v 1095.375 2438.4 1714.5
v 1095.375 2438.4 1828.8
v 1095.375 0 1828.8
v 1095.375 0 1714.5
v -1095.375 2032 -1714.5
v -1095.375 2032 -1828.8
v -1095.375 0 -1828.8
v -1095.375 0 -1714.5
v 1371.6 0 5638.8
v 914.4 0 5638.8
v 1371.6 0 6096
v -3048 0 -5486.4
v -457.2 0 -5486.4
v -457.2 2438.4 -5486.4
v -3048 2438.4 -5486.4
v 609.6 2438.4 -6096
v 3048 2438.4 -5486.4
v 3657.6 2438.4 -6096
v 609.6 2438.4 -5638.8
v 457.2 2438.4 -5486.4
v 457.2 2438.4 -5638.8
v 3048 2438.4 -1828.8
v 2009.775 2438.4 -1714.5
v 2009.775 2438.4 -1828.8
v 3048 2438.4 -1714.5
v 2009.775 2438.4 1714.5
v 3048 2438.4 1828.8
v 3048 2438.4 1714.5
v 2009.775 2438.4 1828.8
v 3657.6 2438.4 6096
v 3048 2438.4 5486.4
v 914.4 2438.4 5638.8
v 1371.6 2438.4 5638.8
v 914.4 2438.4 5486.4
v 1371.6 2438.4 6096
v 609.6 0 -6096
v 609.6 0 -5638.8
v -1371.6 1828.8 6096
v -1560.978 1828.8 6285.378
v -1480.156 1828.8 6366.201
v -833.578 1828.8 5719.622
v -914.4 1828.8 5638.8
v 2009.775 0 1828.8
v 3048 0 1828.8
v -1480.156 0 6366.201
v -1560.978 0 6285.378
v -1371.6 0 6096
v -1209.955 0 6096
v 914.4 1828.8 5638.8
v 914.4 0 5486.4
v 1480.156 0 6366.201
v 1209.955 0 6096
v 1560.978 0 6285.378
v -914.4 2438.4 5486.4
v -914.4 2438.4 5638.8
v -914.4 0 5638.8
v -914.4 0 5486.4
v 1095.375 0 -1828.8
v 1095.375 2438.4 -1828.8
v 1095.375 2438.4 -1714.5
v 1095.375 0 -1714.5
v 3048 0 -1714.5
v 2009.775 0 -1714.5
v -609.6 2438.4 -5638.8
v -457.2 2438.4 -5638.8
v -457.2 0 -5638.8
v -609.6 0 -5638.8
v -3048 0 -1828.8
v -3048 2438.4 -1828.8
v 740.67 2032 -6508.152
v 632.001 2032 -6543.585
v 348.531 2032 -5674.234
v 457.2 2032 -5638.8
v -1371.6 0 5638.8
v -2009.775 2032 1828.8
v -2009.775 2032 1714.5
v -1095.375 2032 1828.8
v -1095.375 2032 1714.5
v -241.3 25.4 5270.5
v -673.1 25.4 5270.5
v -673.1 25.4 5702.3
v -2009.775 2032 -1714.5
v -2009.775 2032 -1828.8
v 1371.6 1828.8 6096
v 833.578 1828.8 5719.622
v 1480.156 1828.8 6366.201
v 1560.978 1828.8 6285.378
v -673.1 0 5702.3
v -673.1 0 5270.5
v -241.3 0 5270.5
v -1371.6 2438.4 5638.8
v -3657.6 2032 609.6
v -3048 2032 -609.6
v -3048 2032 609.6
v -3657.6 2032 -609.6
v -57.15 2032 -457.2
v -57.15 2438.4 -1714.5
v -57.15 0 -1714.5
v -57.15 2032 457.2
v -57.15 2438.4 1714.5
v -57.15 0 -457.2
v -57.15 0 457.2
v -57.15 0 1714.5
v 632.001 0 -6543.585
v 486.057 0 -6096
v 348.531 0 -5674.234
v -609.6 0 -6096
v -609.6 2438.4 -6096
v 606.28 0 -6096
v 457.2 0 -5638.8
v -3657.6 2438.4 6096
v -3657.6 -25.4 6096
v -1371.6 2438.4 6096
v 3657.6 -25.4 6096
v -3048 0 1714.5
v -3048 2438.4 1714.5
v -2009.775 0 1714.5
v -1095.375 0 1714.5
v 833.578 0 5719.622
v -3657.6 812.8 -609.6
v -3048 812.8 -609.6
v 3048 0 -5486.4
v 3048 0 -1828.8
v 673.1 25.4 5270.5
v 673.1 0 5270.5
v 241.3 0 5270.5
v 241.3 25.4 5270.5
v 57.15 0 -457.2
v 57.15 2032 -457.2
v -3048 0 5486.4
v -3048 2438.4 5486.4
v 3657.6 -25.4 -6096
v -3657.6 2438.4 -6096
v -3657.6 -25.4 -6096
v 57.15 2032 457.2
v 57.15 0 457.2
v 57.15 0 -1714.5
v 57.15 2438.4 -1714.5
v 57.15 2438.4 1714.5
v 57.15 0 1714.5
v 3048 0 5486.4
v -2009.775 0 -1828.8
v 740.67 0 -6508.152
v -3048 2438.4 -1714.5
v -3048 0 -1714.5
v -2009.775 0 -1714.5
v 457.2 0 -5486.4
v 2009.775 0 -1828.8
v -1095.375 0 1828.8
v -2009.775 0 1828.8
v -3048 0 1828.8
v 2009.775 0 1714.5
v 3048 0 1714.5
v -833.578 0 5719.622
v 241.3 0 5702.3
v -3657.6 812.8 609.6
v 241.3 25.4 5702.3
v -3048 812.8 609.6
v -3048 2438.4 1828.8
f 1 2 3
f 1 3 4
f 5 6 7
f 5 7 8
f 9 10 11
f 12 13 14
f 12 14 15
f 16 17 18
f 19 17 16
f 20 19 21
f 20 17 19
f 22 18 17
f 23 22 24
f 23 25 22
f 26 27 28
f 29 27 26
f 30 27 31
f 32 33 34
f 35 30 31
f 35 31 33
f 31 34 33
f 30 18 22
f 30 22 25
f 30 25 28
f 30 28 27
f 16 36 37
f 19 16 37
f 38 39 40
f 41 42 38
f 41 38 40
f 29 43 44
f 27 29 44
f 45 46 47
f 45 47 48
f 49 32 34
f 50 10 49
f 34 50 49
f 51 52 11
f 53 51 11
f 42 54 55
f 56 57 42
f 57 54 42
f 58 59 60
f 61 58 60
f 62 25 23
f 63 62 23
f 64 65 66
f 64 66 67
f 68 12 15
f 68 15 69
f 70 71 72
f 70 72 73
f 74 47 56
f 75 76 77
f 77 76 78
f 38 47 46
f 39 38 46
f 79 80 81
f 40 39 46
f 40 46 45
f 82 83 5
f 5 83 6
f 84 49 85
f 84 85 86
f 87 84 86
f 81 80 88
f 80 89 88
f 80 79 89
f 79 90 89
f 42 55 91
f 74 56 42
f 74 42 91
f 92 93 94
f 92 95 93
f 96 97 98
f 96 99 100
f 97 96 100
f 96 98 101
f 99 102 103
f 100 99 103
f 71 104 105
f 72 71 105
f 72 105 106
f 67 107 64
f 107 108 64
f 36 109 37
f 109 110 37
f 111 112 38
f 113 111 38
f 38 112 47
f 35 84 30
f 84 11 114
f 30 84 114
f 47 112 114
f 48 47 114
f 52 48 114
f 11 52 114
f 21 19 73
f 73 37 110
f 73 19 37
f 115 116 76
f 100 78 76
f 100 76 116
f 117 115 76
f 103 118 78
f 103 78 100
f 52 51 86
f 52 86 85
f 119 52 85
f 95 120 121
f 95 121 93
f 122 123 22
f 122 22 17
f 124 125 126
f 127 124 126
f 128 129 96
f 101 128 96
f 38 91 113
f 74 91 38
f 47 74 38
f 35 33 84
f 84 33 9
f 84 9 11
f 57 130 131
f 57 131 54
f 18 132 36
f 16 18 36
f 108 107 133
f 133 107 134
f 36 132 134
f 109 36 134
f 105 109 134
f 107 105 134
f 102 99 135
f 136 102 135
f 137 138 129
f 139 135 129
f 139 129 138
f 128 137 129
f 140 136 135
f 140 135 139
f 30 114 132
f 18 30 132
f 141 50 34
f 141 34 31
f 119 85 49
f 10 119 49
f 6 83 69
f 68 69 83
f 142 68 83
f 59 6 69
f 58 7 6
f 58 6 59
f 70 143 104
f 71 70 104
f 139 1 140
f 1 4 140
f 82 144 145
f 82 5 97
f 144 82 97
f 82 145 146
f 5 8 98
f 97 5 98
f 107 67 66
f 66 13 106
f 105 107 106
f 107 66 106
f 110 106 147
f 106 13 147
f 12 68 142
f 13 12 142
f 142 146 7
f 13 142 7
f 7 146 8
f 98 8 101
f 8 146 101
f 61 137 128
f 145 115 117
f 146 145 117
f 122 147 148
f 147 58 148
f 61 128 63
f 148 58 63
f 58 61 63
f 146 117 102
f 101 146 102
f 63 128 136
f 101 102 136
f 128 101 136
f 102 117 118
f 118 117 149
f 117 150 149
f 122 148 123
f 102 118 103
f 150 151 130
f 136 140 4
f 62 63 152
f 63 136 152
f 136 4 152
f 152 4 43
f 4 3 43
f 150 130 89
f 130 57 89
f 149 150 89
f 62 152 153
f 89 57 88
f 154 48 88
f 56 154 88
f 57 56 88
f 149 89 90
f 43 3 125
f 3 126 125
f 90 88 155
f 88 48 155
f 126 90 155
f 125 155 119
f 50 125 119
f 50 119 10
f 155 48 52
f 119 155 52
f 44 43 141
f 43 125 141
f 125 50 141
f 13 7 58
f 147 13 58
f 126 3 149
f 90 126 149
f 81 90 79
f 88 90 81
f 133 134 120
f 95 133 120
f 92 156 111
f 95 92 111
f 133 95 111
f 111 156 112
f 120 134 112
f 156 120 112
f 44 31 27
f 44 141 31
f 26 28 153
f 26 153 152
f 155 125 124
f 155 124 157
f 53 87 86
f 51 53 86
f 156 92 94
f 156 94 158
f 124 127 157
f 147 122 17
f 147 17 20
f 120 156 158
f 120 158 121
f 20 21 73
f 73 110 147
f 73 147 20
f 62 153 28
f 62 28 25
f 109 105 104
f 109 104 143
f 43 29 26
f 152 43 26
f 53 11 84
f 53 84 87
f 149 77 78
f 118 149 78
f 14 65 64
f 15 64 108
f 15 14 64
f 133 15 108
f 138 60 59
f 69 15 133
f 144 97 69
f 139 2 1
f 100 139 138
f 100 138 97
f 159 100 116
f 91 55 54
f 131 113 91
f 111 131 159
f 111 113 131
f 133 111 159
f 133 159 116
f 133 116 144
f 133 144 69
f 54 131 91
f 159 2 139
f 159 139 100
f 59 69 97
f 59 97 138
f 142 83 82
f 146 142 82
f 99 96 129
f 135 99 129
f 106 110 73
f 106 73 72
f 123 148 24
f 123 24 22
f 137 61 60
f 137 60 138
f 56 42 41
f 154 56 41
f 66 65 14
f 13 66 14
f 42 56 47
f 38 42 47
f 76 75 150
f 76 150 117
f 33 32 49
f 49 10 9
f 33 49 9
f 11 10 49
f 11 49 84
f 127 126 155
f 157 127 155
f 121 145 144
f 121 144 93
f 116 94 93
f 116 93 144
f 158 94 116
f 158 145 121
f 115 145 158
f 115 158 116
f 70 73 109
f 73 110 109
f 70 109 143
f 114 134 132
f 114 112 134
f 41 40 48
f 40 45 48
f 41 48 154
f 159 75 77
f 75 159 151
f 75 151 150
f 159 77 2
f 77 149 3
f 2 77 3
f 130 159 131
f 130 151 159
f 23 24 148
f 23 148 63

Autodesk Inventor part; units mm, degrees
ref_plane "YZ Plane" through (0, 0, 0) normal (1, 0, 0) x (0, 1, 0)
ref_plane "XZ Plane" through (0, 0, 0) normal (0, 1, 0) x (-1, 0, 0)
ref_plane "XY Plane" through (0, 0, 0) normal (0, 0, 1) x (1, 0, 0)
sketch "Sketch1" plane through (0, 0, 0) normal (0, 1, 0) x (-1, 0, 0)
  line L0 (3657.6, -6096) -> (3657.6, 6096)
  line L1 (-3657.6, 6096) -> (-3657.6, -6096)
  line L2 (-5120.64, 0) -> (5120.64, 0) projected
  line L3 (0, -23842.3169) -> (0, 22994.4703) projected
  line L4 (-3048, 1714.5) -> (-3048, -1714.5)
  line L5 (3048, -5486.4) -> (3048, -1828.8)
  line L6 (3048, -1714.5) -> (3048, 1714.5)
  line L7 (3048, 1828.8) -> (3048, 5486.4)
  line L8 (-3048, -1828.8) -> (-3048, -5486.4)
  line L9 (-3048, 5486.4) -> (-3048, 1828.8)
  line L10 (-3048, 1714.5) -> (-3048, -1714.5)
  line L11 (-2009.775, -1828.8) -> (-2009.775, -1714.5)
  line L12 (-1095.375, -1828.8) -> (-1095.375, -1714.5)
  line L13 (-3048, -1714.5) -> (-2009.775, -1714.5)
  line L14 (-1095.375, -1714.5) -> (-57.15, -1714.5)
  line L15 (-3048, -1828.8) -> (-2009.775, -1828.8)
  line L16 (2009.775, -1828.8) -> (2009.775, -1714.5)
  line L17 (1095.375, -1828.8) -> (1095.375, -1714.5)
  line L18 (3048, -1714.5) -> (2009.775, -1714.5)
  line L19 (1095.375, -1714.5) -> (57.15, -1714.5)
  line L20 (3048, -1828.8) -> (2009.775, -1828.8)
  line L21 (1095.375, -1828.8) -> (-1095.375, -1828.8)
  line L22 (-2009.775, -1828.8) -> (-3048, -1828.8)
  line L23 (-1095.375, -1828.8) -> (1095.375, -1828.8)
  line L24 (2009.775, -1828.8) -> (3048, -1828.8)
  line L25 (57.15, -1714.5) -> (1095.375, -1714.5)
  line L26 (2009.775, -1714.5) -> (3048, -1714.5)
  line L27 (-2009.775, 1828.8) -> (-2009.775, 1714.5)
  line L28 (-1095.375, 1828.8) -> (-1095.375, 1714.5)
  line L29 (-3048, 1714.5) -> (-2009.775, 1714.5)
  line L30 (-1095.375, 1714.5) -> (-57.15, 1714.5)
  line L31 (-3048, 1828.8) -> (-2009.775, 1828.8)
  line L32 (3048, 1714.5) -> (2009.775, 1714.5)
  line L33 (3048, 1828.8) -> (2009.775, 1828.8)
  line L34 (2009.775, 1828.8) -> (2009.775, 1714.5)
  line L35 (1095.375, 1828.8) -> (1095.375, 1714.5)
  line L36 (1095.375, 1714.5) -> (57.15, 1714.5)
  line L37 (1095.375, 1828.8) -> (-1095.375, 1828.8)
  line L38 (-2009.775, 1828.8) -> (-3048, 1828.8)
  line L39 (-1095.375, 1828.8) -> (1095.375, 1828.8)
  line L40 (2009.775, 1828.8) -> (3048, 1828.8)
  line L41 (57.15, 1714.5) -> (1095.375, 1714.5)
  line L42 (2009.775, 1714.5) -> (3048, 1714.5)
  line L43 (-57.15, -457.2) -> (57.15, -457.2)
  line L44 (57.15, 457.2) -> (-57.15, 457.2)
  line L45 (-609.6, -6096) -> (-609.6, -5486.4)
  line L46 (609.6, -6096) -> (609.6, -5486.4)
  line L47 (-3048, -5486.4) -> (-609.6, -5486.4)
  line L48 (609.6, -5486.4) -> (3048, -5486.4)
  line L49 (-3657.6, -6096) -> (-609.6, -6096)
  line L50 (609.6, -6096) -> (3657.6, -6096)
  line L51 (914.4, 5486.4) -> (914.4, 6096)
  line L52 (-914.4, 6096) -> (-914.4, 5486.4)
  line L53 (3048, 5486.4) -> (914.4, 5486.4)
  line L54 (-914.4, 5486.4) -> (-3048, 5486.4)
  line L55 (3657.6, 6096) -> (914.4, 6096)
  line L56 (-914.4, 6096) -> (-3657.6, 6096)
  line L57 (-57.15, -1714.5) -> (-57.15, -457.2)
  line L58 (-57.15, 457.2) -> (-57.15, 1714.5)
  line L59 (-57.15, 1714.5) -> (-57.15, 457.2)
  line L60 (-57.15, -457.2) -> (-57.15, -1714.5)
  line L61 (57.15, -1714.5) -> (57.15, -457.2)
  line L62 (57.15, 457.2) -> (57.15, 1714.5)
  line L63 (57.15, 1714.5) -> (57.15, 457.2)
  line L64 (57.15, -457.2) -> (57.15, -1714.5)
  line L65 (-3048, 5486.4) -> (-3048, 1828.8)
  line L66 (-3048, 1828.8) -> (-2009.775, 1828.8)
  line L67 (-2009.775, 1828.8) -> (-2009.775, 1714.5)
  line L68 (-2009.775, 1714.5) -> (-3048, 1714.5)
  line L69 (-3048, 1714.5) -> (-3048, -1714.5)
  line L70 (-3048, -1714.5) -> (-2009.775, -1714.5)
  line L71 (-2009.775, -1714.5) -> (-2009.775, -1828.8)
  line L72 (-2009.775, -1828.8) -> (-3048, -1828.8)
  line L73 (-3048, -1828.8) -> (-3048, -5486.4)
  line L74 (-3048, -5486.4) -> (-609.6, -5486.4)
  line L75 (609.6, -5486.4) -> (3048, -5486.4)
  line L76 (3048, -5486.4) -> (3048, -1828.8)
  line L77 (3048, -1828.8) -> (2009.775, -1828.8)
  line L78 (2009.775, -1828.8) -> (2009.775, -1714.5)
  line L79 (2009.775, -1714.5) -> (3048, -1714.5)
  line L80 (3048, 1714.5) -> (3048, -1714.5)
  line L81 (3048, 1714.5) -> (2009.775, 1714.5)
  line L82 (2009.775, 1714.5) -> (2009.775, 1828.8)
  line L83 (2009.775, 1828.8) -> (3048, 1828.8)
  line L84 (3048, 1828.8) -> (3048, 5486.4)
  point P0 (0, 0)
  point P1 (0, 23842.3169)
  point P2 (0, -22994.4703)
  dimension "d2" = 7315.2
  dimension "d10" = 609.6
  dimension "d13" = 1038.225
  dimension "d14" = 914.4
  dimension "d17" = 114.3
  dimension "d18" = 1038.225
  dimension "d19" = 1038.225
  dimension "d20" = 914.4
  dimension "d21" = 1219.2
  dimension "d23" = 609.6
  dimension "d24" = 4267.2
  dimension "d25" = 1828.8
  dimension "d26" = 12192
  dimension "d27" = 609.6
  dimension "d28" = 114.3
extrude "Extrusion1" add sketch "Sketch1" along normal blind 2438.4
sketch "Sketch2" plane through (-3657.6, 0, -6096) normal (-1, 0, 0) x (0, 0, 1)
  line L0 (0, 0) -> (12192, 0) projected
  line L1 (5486.4, 2032) -> (6705.6, 2032)
  line L2 (6705.6, 2032) -> (6705.6, 812.8)
  line L3 (6705.6, 812.8) -> (5486.4, 812.8)
  line L4 (5486.4, 812.8) -> (5486.4, 2032)
  line L5 (6096, 2926.08) -> (6096, -487.68) projected
  point P0 (6096, 0)
  dimension "d31" = 1219.2
  dimension "d33" = 1219.2
  dimension "d34" = 812.8
extrude "Extrusion2" cut sketch "Sketch2" against normal up to surface (609.6 mm away)
sketch "Sketch3" plane through (0, 2438.4, 0) normal (0, 1, 0) x (1, 0, 0)
  line L0 (57.15, 1714.5) -> (1095.375, 1714.5) projected
  line L1 (1095.375, 1714.5) -> (1095.375, 1828.8) projected
  line L2 (1095.375, 1828.8) -> (-1095.375, 1828.8) projected
  line L3 (-1095.375, 1828.8) -> (-1095.375, 1714.5) projected
  line L4 (-1095.375, 1714.5) -> (-57.15, 1714.5) projected
  line L5 (-57.15, 1714.5) -> (-57.15, 457.2) projected
  line L6 (-57.15, 457.2) -> (57.15, 457.2) projected
  line L7 (57.15, 457.2) -> (57.15, 1714.5) projected
  line L8 (-57.15, -1714.5) -> (-1095.375, -1714.5) projected
  line L9 (-1095.375, -1714.5) -> (-1095.375, -1828.8) projected
  line L10 (-1095.375, -1828.8) -> (1095.375, -1828.8) projected
  line L11 (1095.375, -1828.8) -> (1095.375, -1714.5) projected
  line L12 (1095.375, -1714.5) -> (57.15, -1714.5) projected
  line L13 (57.15, -1714.5) -> (57.15, -457.2) projected
  line L14 (57.15, -457.2) -> (-57.15, -457.2) projected
  line L15 (-57.15, -457.2) -> (-57.15, -1714.5) projected
  line L16 (3657.6, 6096) -> (609.6, 6096) projected
  line L17 (609.6, 6096) -> (609.6, 5486.4) projected
  line L18 (609.6, 5486.4) -> (3048, 5486.4) projected
  line L19 (3048, 5486.4) -> (3048, 1828.8) projected
  line L20 (3048, 1828.8) -> (2009.775, 1828.8) projected
  line L21 (2009.775, 1828.8) -> (2009.775, 1714.5) projected
  line L22 (2009.775, 1714.5) -> (3048, 1714.5) projected
  line L23 (3048, 1714.5) -> (3048, -1714.5) projected
  line L24 (3048, -1714.5) -> (2009.775, -1714.5) projected
  line L25 (2009.775, -1714.5) -> (2009.775, -1828.8) projected
  line L26 (2009.775, -1828.8) -> (3048, -1828.8) projected
  line L27 (3048, -1828.8) -> (3048, -5486.4) projected
  line L28 (3048, -5486.4) -> (914.4, -5486.4) projected
  line L29 (914.4, -5486.4) -> (914.4, -6096) projected
  line L30 (914.4, -6096) -> (3657.6, -6096) projected
  line L31 (3657.6, -6096) -> (3657.6, 6096) projected
  line L32 (-609.6, 6096) -> (609.6, 6096)
  line L33 (609.6, 6096) -> (609.6, 5486.4)
  line L34 (609.6, 5486.4) -> (-609.6, 5486.4)
  line L35 (-609.6, 5486.4) -> (-609.6, 6096)
  line L36 (-2009.775, 1828.8) -> (-1095.375, 1828.8)
  line L37 (-1095.375, 1828.8) -> (-1095.375, 1714.5)
  line L38 (-1095.375, 1714.5) -> (-2009.775, 1714.5)
  line L39 (-2009.775, 1714.5) -> (-2009.775, 1828.8)
  line L40 (1095.375, 1828.8) -> (2009.775, 1828.8)
  line L41 (2009.775, 1828.8) -> (2009.775, 1714.5)
  line L42 (2009.775, 1714.5) -> (1095.375, 1714.5)
  line L43 (1095.375, 1714.5) -> (1095.375, 1828.8)
  line L44 (-57.15, 457.2) -> (57.15, 457.2)
  line L45 (57.15, 457.2) -> (57.15, -457.2)
  line L46 (57.15, -457.2) -> (-57.15, -457.2)
  line L47 (-57.15, -457.2) -> (-57.15, 457.2)
  line L48 (1095.375, -1714.5) -> (2009.775, -1714.5)
  line L49 (2009.775, -1714.5) -> (2009.775, -1828.8)
  line L50 (2009.775, -1828.8) -> (1095.375, -1828.8)
  line L51 (1095.375, -1828.8) -> (1095.375, -1714.5)
  line L52 (-2009.775, -1714.5) -> (-1095.375, -1714.5)
  line L53 (-1095.375, -1714.5) -> (-1095.375, -1828.8)
  line L54 (-1095.375, -1828.8) -> (-2009.775, -1828.8)
  line L55 (-2009.775, -1828.8) -> (-2009.775, -1714.5)
  line L56 (-914.4, -5486.4) -> (914.4, -5486.4)
  line L57 (914.4, -5486.4) -> (914.4, -6096)
  line L58 (914.4, -6096) -> (-914.4, -6096)
  line L59 (-914.4, -6096) -> (-914.4, -5486.4)
  line L60 (1095.375, 1828.8) -> (2009.775, 1828.8)
  line L61 (2009.775, 1828.8) -> (2009.775, 1714.5)
  line L62 (2009.775, 1714.5) -> (1095.375, 1714.5)
  line L63 (1095.375, 1714.5) -> (1095.375, 1828.8)
  point P0 (0, 0)
extrude "Extrusion3" add sketch "Sketch3" against normal blind 406.4 contours L1 L40 L21 L42 | L45 L14 L47 L6 | L3 L38 L39 L36 | L48 L25 L50 L11 | L9 L54 L55 L52 | L34 L35 L32 L17 | L29 L58 L59 L56
sketch "Sketch5" plane through (0, 0, 0) normal (0, -1, 0) x (1, 0, 0)
  line L0 (3657.6, -6096) -> (609.6, -6096) projected
  line L1 (3657.6, 6096) -> (3657.6, -6096) projected
  line L2 (914.4, 6096) -> (3657.6, 6096) projected
  line L3 (914.4, 5486.4) -> (914.4, 6096) projected
  line L4 (3048, 5486.4) -> (914.4, 5486.4) projected
  line L5 (3048, 1828.8) -> (3048, 5486.4) projected
  line L6 (2009.775, 1828.8) -> (3048, 1828.8) projected
  line L7 (2009.775, 1714.5) -> (2009.775, 1828.8) projected
  line L8 (3048, 1714.5) -> (2009.775, 1714.5) projected
  line L9 (3048, -1714.5) -> (3048, 1714.5) projected
  line L10 (2009.775, -1714.5) -> (3048, -1714.5) projected
  line L11 (2009.775, -1828.8) -> (2009.775, -1714.5) projected
  line L12 (3048, -1828.8) -> (2009.775, -1828.8) projected
  line L13 (3048, -5486.4) -> (3048, -1828.8) projected
  line L14 (609.6, -5486.4) -> (3048, -5486.4) projected
  line L15 (609.6, -6096) -> (609.6, -5486.4) projected
  line L16 (-3657.6, 6096) -> (3657.6, 6096)
  line L17 (3657.6, 6096) -> (3657.6, -6096)
  line L18 (3657.6, -6096) -> (-3657.6, -6096)
  line L19 (-3657.6, -6096) -> (-3657.6, 6096)
  point P0 (0, 0)
extrude "Extrusion5" add sketch "Sketch5" along normal blind 25.4
sketch "Sketch6" plane through (0, 0, 0) normal (0, 1, 0) x (1, 0, 0)
  line L0 (-3048, 5486.4) -> (-609.6, 5486.4) projected
  line L1 (-3048, 1828.8) -> (-3048, 5486.4) projected
  line L2 (57.15, 1714.5) -> (1095.375, 1714.5) projected
  line L3 (2009.775, 1714.5) -> (3048, 1714.5) projected
  line L4 (3048, 1714.5) -> (3048, -1714.5) projected
  circle A0 centre (1549.4, 0) radius 152.4
  line L5 (-1095.375, -1828.8) -> (-1095.375, -1714.5) projected
  line L6 (3048, 1828.8) -> (2009.775, 1828.8) projected
  line L7 (2009.775, 1828.8) -> (2009.775, 1714.5) projected
  line L8 (1095.375, 1828.8) -> (-1095.375, 1828.8) projected
  line L9 (1095.375, 1714.5) -> (1095.375, 1828.8) projected
  circle A1 centre (-1549.4, -3657.6) radius 152.4
  circle A2 centre (1549.4, -3657.6) radius 152.4
  line L10 (3048, -1828.8) -> (3048, -5486.4) projected
  line L11 (3048, -5486.4) -> (914.4, -5486.4) projected
  line L12 (-914.4, -5486.4) -> (-3048, -5486.4) projected
  line L13 (-3048, -5486.4) -> (-3048, -1828.8) projected
  line L14 (-1095.375, -1828.8) -> (1095.375, -1828.8) projected
  line L15 (-3048, -1828.8) -> (-2009.775, -1828.8) projected
  line L16 (609.6, 6096) -> (609.6, 5486.4) projected
  line L17 (-609.6, 5486.4) -> (-609.6, 6096) projected
  line L18 (215.9, 5702.3) -> (-215.9, 5702.3)
  line L19 (-2009.775, -1714.5) -> (-3048, -1714.5) projected
  line L20 (914.4, -5486.4) -> (914.4, -6096) projected
  line L21 (-914.4, -6096) -> (-914.4, -5486.4) projected
  circle A3 centre (457.2, -5486.4) radius 152.4
  line L22 (673.1, -5270.5) -> (241.3, -5270.5)
  line L23 (241.3, -5270.5) -> (241.3, -5702.3)
  line L24 (673.1, -5270.5) -> (241.3, -5702.3)
  line L25 (-241.3, -5270.5) -> (-673.1, -5270.5)
  circle A4 centre (-457.2, -5486.4) radius 152.4
  line L26 (-241.3, -5270.5) -> (-673.1, -5702.3)
  line L27 (-673.1, -5270.5) -> (-673.1, -5702.3)
  line L28 (2009.775, 1714.5) -> (2009.775, 1828.8) projected
  line L29 (5120.64, 0) -> (-5120.64, 0) projected
  point P0 (0, 0)
  point P1 (457.2, -5486.4)
  point P2 (-457.2, -5486.4)
  dimension "d101" = 304.8
  dimension "d106" = 1498.6
  dimension "d120" = 1498.6
  dimension "d121" = 1828.8
  dimension "d154" = 431.8
  dimension "d156" = 304.8
  dimension "d157" = 431.8
  dimension "d158" = 431.8
  dimension "d159" = 215.9
  dimension "d160" = 304.8
  dimension "d161" = 431.8
  dimension "d162" = 431.8
  dimension "d163" = 215.9
  dimension "d164" = 457.2
  dimension "d165" = 457.2
extrude "Extrusion22" add sketch "Sketch6" along normal blind 25.4 contours L24 A3 | A3 L24 L23 L22 | L26 A4 L27 L25 | L26 A4 picked at (443.3203, -5425.7518) picked at (-471.0797, -5425.7518)
sketch "Sketch7" plane through (0, 2438.4, 0) normal (0, 1, 0) x (1, 0, 0)
  line L0 (-241.3, -5270.5) -> (-673.1, -5702.3) projected
  line L1 (-673.1, -5702.3) -> (-673.1, -5270.5) projected
  line L2 (-673.1, -5270.5) -> (-241.3, -5270.5) projected
  line L3 (673.1, -5270.5) -> (241.3, -5702.3) projected
  line L4 (241.3, -5702.3) -> (241.3, -5270.5) projected
  line L5 (241.3, -5270.5) -> (673.1, -5270.5) projected
  line L6 (-914.4, -6096) -> (-914.4, -5486.4) projected
  line L7 (914.4, -6096) -> (-914.4, -6096) projected
  line L8 (914.4, -5486.4) -> (914.4, -6096) projected
  line L9 (3048, -5486.4) -> (914.4, -5486.4) projected
  line L10 (3048, -1828.8) -> (3048, -5486.4) projected
  line L11 (2009.775, -1828.8) -> (3048, -1828.8) projected
  line L12 (2009.775, -1714.5) -> (2009.775, -1828.8) projected
  line L13 (3048, -1714.5) -> (2009.775, -1714.5) projected
  line L14 (3048, 1714.5) -> (3048, -1714.5) projected
  line L15 (2009.775, 1714.5) -> (3048, 1714.5) projected
  line L16 (2009.775, 1828.8) -> (2009.775, 1714.5) projected
  line L17 (3048, 1828.8) -> (2009.775, 1828.8) projected
  line L18 (3048, 5486.4) -> (3048, 1828.8) projected
  line L19 (609.6, 5486.4) -> (3048, 5486.4) projected
  line L20 (609.6, 6096) -> (609.6, 5486.4) projected
  line L21 (-609.6, 6096) -> (609.6, 6096) projected
  line L22 (-609.6, 5486.4) -> (-609.6, 6096) projected
  line L23 (-3048, 5486.4) -> (-609.6, 5486.4) projected
  line L24 (-3048, 1828.8) -> (-3048, 5486.4) projected
  line L25 (-2009.775, 1828.8) -> (-3048, 1828.8) projected
  line L26 (-2009.775, 1714.5) -> (-2009.775, 1828.8) projected
  line L27 (-3048, 1714.5) -> (-2009.775, 1714.5) projected
  line L28 (-3048, -1714.5) -> (-3048, 1714.5) projected
  line L29 (-2009.775, -1714.5) -> (-3048, -1714.5) projected
  line L30 (-2009.775, -1828.8) -> (-2009.775, -1714.5) projected
  line L31 (-3048, -1828.8) -> (-2009.775, -1828.8) projected
  line L32 (-3048, -5486.4) -> (-3048, -1828.8) projected
  line L33 (-914.4, -5486.4) -> (-3048, -5486.4) projected
  line L34 (1095.375, -1714.5) -> (57.15, -1714.5) projected
  line L35 (1095.375, -1828.8) -> (1095.375, -1714.5) projected
  line L36 (-1095.375, -1828.8) -> (1095.375, -1828.8) projected
  line L37 (-1095.375, -1714.5) -> (-1095.375, -1828.8) projected
  line L38 (-57.15, -1714.5) -> (-1095.375, -1714.5) projected
  line L39 (-57.15, -457.2) -> (-57.15, -1714.5) projected
  line L40 (57.15, -457.2) -> (-57.15, -457.2) projected
  line L41 (57.15, -1714.5) -> (57.15, -457.2) projected
  line L42 (-57.15, 457.2) -> (57.15, 457.2) projected
  line L43 (-57.15, 1714.5) -> (-57.15, 457.2) projected
  line L44 (-1095.375, 1714.5) -> (-57.15, 1714.5) projected
  line L45 (-1095.375, 1828.8) -> (-1095.375, 1714.5) projected
  line L46 (1095.375, 1828.8) -> (-1095.375, 1828.8) projected
  line L47 (1095.375, 1714.5) -> (1095.375, 1828.8) projected
  line L48 (57.15, 1714.5) -> (1095.375, 1714.5) projected
  line L49 (57.15, 457.2) -> (57.15, 1714.5) projected
  line L50 (1095.375, 1828.8) -> (2009.775, 1828.8)
  line L51 (2009.775, 1828.8) -> (2009.775, 1714.5)
  line L52 (2009.775, 1714.5) -> (1095.375, 1714.5)
  line L53 (1095.375, 1714.5) -> (1095.375, 1828.8)
  line L54 (1095.375, -1714.5) -> (2009.775, -1714.5)
  line L55 (2009.775, -1714.5) -> (2009.775, -1828.8)
  line L56 (2009.775, -1828.8) -> (1095.375, -1828.8)
  line L57 (1095.375, -1828.8) -> (1095.375, -1714.5)
  line L58 (-914.4, -5486.4) -> (914.4, -5486.4)
  line L59 (914.4, -5486.4) -> (914.4, -6096)
  line L60 (914.4, -6096) -> (-914.4, -6096)
  line L61 (-914.4, -6096) -> (-914.4, -5486.4)
  point P0 (0, 0)
extrude "Extrusion23" cut sketch "Sketch7" against normal up to surface (406.4 mm away) contours L58 L4 L3 L8 L7 L6 L1 L0 | L0 L1 L58 | L58 L3 L4 | L56 L35 L54 L12 | L52 L47 L50 L16
sketch "Sketch8" plane through (0, 0, 0) normal (0, 1, 0) x (1, 0, 0)
  line L0 (673.1, -5270.5) -> (241.3, -5702.3) projected
  line L1 (-914.4, -6096) -> (-914.4, -5486.4) projected
  line L2 (-914.4, -5486.4) -> (-3048, -5486.4) projected
  line L3 (-3657.6, -6096) -> (-3657.6, 6096) projected
  line L4 (-3657.6, 6096) -> (3657.6, 6096) projected
  line L5 (3657.6, 6096) -> (3657.6, -6096) projected
  line L6 (3657.6, -6096) -> (-3657.6, -6096) projected
  line L7 (-914.4, -5638.8) -> (-1371.6, -5638.8)
  line L8 (-1371.6, -5638.8) -> (-1371.6, -6096)
  line L9 (-1371.6, -6096) -> (-914.4, -6096)
  line L10 (-914.4, -6096) -> (-914.4, -5638.8)
  line L11 (0, 9125.5425) -> (0, -8948.1579) projected
  line L12 (-914.4, -5638.8) -> (-1560.9784, -6285.3784)
  line L13 (-1560.9784, -6285.3784) -> (-1480.1561, -6366.2007)
  line L14 (-1480.1561, -6366.2007) -> (-833.5777, -5719.6223)
  line L15 (-914.4, -5638.8) -> (-833.5777, -5719.6223)
  line L16 (914.4, -6096) -> (914.4, -5486.4)
  line L17 (-3657.6, -6096) -> (3657.6, -6096)
  line L18 (914.4, -5638.8) -> (1371.6, -5638.8)
  line L19 (1371.6, -5638.8) -> (1371.6, -6096)
  line L20 (914.4, -5638.8) -> (1560.9784, -6285.3784)
  line L21 (1560.9784, -6285.3784) -> (1480.1561, -6366.2007)
  line L22 (1480.1561, -6366.2007) -> (833.5777, -5719.6223)
  line L23 (833.5777, -5719.6223) -> (914.4, -5638.8)
  line L24 (914.4, -5638.8) -> (1371.6, -5638.8)
  line L25 (1371.6, -5638.8) -> (1371.6, -6096)
  line L26 (1371.6, -6096) -> (914.4, -6096)
  line L27 (914.4, -6096) -> (914.4, -5638.8)
  line L28 (914.4, -5638.8) -> (833.5777, -5719.6223)
  line L29 (833.5777, -5719.6223) -> (1480.1561, -6366.2007)
  line L30 (1480.1561, -6366.2007) -> (1560.9784, -6285.3784)
  line L31 (1560.9784, -6285.3784) -> (914.4, -5638.8)
  line L32 (-609.6, 5486.4) -> (-609.6, 6096) projected
  line L33 (-3048, 5486.4) -> (-609.6, 5486.4) projected
  line L34 (-609.6, 5638.8) -> (-457.2, 5638.8)
  line L35 (-457.2, 5638.8) -> (-457.2, 5486.4)
  line L36 (-457.2, 5486.4) -> (-609.6, 5486.4)
  line L37 (-609.6, 5486.4) -> (-609.6, 5638.8)
  line L38 (609.6, 5486.4) -> (609.6, 6096)
  line L39 (3048, 5486.4) -> (609.6, 5486.4)
  line L40 (609.6, 5638.8) -> (457.2, 5638.8)
  line L41 (457.2, 5638.8) -> (457.2, 5486.4)
  line L42 (457.2, 5486.4) -> (609.6, 5486.4)
  line L43 (609.6, 5486.4) -> (609.6, 5638.8)
  line L44 (457.2, 5638.8) -> (740.6702, 6508.1515)
  line L45 (740.6702, 6508.1515) -> (632.0012, 6543.5853)
  line L46 (632.0012, 6543.5853) -> (348.5311, 5674.2338)
  line L47 (457.2, 5638.8) -> (348.5311, 5674.2338)
  point P0 (564.9631, -5378.6369)
  point P1 (0, 0)
  dimension "d182" = 457.2
  dimension "d184" = 152.4
  dimension "d187" = 114.3
  dimension "d188" = 914.4
  dimension "d193" = 152.4
  dimension "d194" = 152.4
  dimension "d195" = 114.3
  dimension "d196" = 914.4
extrude "Extrusion24" cut sketch "Sketch8" along normal up to surface (2438.4 mm away) contours L6 L14 L1 | L14 L6 L12 L1 | L12 L8 L7 | L16 L22 L6 | L22 L16 L20 L6 | L20 L18 L19
extrude "Extrusion25" add sketch "Sketch8" along normal blind 1828.8 contours L14 L6 L12 L1 | L1 L15 L14 | L14 L13 L12 L6 | L22 L16 L20 L6 | L6 L20 L21 L22 | L22 L23 L16
extrude "Extrusion26" add sketch "Sketch8" along normal blind 2438.4 contours L34 L35 L36 L32 | L40 L38 L42 L41
sketch "Sketch10" plane through (0, 2438.4, 0) normal (0, 1, 0) x (1, 0, 0)
  line L0 (457.2, 5638.8) -> (457.2, 5486.4) projected
  line L1 (609.6, 5638.8) -> (609.6, 6096) projected
  line L2 (609.6, 5638.8) -> (457.2, 5638.8) projected
  line L3 (-609.6, 6096) -> (-609.6, 5638.8) projected
  line L4 (-457.2, 5638.8) -> (-609.6, 5638.8) projected
  line L5 (-457.2, 5486.4) -> (-457.2, 5638.8) projected
  line L6 (-609.6, 6096) -> (609.6, 6096)
  line L7 (609.6, 6096) -> (609.6, 5638.8)
  line L8 (609.6, 5638.8) -> (-609.6, 5638.8)
  line L9 (-609.6, 5638.8) -> (-609.6, 6096)
  point P0 (0, 0)
extrude "Extrusion29" cut sketch "Sketch10" against normal blind 2032
extrude "Extrusion30" add sketch "Sketch8" along normal blind 2032 contours L46 L45 L44 L4 | L4 L44 L47 L46
sketch "Sketch11" plane through (0, 2438.4, 0) normal (0, 1, 0) x (1, 0, 0)
  line L0 (-457.2, 5638.8) -> (457.2, 5638.8) projected
  line L1 (457.2, 5638.8) -> (457.2, 5486.4) projected
  line L2 (457.2, 5486.4) -> (-457.2, 5486.4) projected
  line L3 (-457.2, 5486.4) -> (-457.2, 5638.8) projected
  point P0 (0, 0)
extrude "Extrusion31" cut sketch "Sketch11" against normal blind 406.4
sketch "Sketch9" plane through (0, 2438.4, 0) normal (0, 1, 0) x (1, 0, 0)
  line L0 (486.0567, 6096) -> (348.5311, 5674.2338) projected
  line L1 (348.5311, 5674.2338) -> (457.2, 5638.8) projected
  line L2 (457.2, 5638.8) -> (457.2, 5486.4) projected
  line L3 (457.2, 5486.4) -> (-457.2, 5486.4) projected
  line L4 (-457.2, 5486.4) -> (-457.2, 5638.8) projected
  line L5 (-457.2, 5638.8) -> (-609.6, 5638.8) projected
  line L6 (-609.6, 6096) -> (-609.6, 5638.8) projected
  line L7 (-609.6, 6096) -> (486.0567, 6096) projected
  line L8 (457.2, 5638.8) -> (606.2796, 6096) projected
  line L9 (606.2796, 6096) -> (609.6, 6096) projected
  line L10 (609.6, 5638.8) -> (609.6, 6096) projected
  line L11 (609.6, 5638.8) -> (457.2, 5638.8) projected
  line L12 (-609.6, 6096) -> (609.6, 6096)
  line L13 (609.6, 6096) -> (609.6, 5638.8)
  line L14 (609.6, 5638.8) -> (-609.6, 5638.8)
  line L15 (-609.6, 5638.8) -> (-609.6, 6096)
  line L16 (-457.2, 5638.8) -> (457.2, 5638.8)
  line L17 (457.2, 5638.8) -> (457.2, 5486.4)
  line L18 (457.2, 5486.4) -> (-457.2, 5486.4)
  line L19 (-457.2, 5486.4) -> (-457.2, 5638.8)
  point P0 (0, 0)
properties part number "East_Structure_Hose_Test"
